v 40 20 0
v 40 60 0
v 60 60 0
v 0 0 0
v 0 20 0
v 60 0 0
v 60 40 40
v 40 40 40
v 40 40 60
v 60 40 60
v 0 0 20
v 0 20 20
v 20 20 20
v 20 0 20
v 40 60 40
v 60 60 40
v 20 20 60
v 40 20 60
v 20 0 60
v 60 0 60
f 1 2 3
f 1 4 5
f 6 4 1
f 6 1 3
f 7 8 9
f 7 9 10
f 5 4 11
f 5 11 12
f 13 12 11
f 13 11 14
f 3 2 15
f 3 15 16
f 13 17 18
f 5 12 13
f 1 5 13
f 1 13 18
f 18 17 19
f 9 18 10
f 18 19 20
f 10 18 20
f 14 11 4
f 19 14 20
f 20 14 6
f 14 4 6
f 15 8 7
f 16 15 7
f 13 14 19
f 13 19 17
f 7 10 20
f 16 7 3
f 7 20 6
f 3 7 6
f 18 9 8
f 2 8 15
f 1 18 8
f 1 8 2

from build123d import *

# Parameters (mm, degrees)
ESBO_O1_W                = 60
ESBO_O1_H                = 20
RESSALTO_EXTRUS_O1_DEPTH = 20
ESBO_O2_W                = 40
ESBO_O2_H                = 20
RESSALTO_EXTRUS_O2_DEPTH = 40
ESBO_O3_W                = 20
ESBO_O3_H                = 60
RESSALTO_EXTRUS_O3_DEPTH = 20
ESBO_O4_W                = 20
ESBO_O4_H                = 40
RESSALTO_EXTRUS_O4_DEPTH = 20


with BuildPart() as part:
    # Esboço1 → Ressalto-extrusão1 (new body)
    with BuildSketch(Plane.XY):
        with Locations((30, 10)):
            Rectangle(ESBO_O1_W, ESBO_O1_H)
    extrude(amount=RESSALTO_EXTRUS_O1_DEPTH)

    # Esboço2 → Ressalto-extrusão2 (add)
    with BuildSketch(Plane.XY.offset(20)):
        with Locations((40, 10)):
            Rectangle(ESBO_O2_W, ESBO_O2_H)
    extrude(amount=RESSALTO_EXTRUS_O2_DEPTH)

    # Esboço3 → Ressalto-extrusão3 (add)
    with BuildSketch(Plane(origin=(0, 20, 0), x_dir=(1, 0, 0), z_dir=(0, 1, 0))):
        with Locations((50, -30)):
            Rectangle(ESBO_O3_W, ESBO_O3_H)
    extrude(amount=RESSALTO_EXTRUS_O3_DEPTH)

    # Esboço4 → Ressalto-extrusão4 (add)
    with BuildSketch(Plane(origin=(0, 40, 0), x_dir=(1, 0, 0), z_dir=(0, 1, 0))):
        with Locations((50, -20)):
            Rectangle(ESBO_O4_W, ESBO_O4_H)
    extrude(amount=RESSALTO_EXTRUS_O4_DEPTH)


solid = part.part
